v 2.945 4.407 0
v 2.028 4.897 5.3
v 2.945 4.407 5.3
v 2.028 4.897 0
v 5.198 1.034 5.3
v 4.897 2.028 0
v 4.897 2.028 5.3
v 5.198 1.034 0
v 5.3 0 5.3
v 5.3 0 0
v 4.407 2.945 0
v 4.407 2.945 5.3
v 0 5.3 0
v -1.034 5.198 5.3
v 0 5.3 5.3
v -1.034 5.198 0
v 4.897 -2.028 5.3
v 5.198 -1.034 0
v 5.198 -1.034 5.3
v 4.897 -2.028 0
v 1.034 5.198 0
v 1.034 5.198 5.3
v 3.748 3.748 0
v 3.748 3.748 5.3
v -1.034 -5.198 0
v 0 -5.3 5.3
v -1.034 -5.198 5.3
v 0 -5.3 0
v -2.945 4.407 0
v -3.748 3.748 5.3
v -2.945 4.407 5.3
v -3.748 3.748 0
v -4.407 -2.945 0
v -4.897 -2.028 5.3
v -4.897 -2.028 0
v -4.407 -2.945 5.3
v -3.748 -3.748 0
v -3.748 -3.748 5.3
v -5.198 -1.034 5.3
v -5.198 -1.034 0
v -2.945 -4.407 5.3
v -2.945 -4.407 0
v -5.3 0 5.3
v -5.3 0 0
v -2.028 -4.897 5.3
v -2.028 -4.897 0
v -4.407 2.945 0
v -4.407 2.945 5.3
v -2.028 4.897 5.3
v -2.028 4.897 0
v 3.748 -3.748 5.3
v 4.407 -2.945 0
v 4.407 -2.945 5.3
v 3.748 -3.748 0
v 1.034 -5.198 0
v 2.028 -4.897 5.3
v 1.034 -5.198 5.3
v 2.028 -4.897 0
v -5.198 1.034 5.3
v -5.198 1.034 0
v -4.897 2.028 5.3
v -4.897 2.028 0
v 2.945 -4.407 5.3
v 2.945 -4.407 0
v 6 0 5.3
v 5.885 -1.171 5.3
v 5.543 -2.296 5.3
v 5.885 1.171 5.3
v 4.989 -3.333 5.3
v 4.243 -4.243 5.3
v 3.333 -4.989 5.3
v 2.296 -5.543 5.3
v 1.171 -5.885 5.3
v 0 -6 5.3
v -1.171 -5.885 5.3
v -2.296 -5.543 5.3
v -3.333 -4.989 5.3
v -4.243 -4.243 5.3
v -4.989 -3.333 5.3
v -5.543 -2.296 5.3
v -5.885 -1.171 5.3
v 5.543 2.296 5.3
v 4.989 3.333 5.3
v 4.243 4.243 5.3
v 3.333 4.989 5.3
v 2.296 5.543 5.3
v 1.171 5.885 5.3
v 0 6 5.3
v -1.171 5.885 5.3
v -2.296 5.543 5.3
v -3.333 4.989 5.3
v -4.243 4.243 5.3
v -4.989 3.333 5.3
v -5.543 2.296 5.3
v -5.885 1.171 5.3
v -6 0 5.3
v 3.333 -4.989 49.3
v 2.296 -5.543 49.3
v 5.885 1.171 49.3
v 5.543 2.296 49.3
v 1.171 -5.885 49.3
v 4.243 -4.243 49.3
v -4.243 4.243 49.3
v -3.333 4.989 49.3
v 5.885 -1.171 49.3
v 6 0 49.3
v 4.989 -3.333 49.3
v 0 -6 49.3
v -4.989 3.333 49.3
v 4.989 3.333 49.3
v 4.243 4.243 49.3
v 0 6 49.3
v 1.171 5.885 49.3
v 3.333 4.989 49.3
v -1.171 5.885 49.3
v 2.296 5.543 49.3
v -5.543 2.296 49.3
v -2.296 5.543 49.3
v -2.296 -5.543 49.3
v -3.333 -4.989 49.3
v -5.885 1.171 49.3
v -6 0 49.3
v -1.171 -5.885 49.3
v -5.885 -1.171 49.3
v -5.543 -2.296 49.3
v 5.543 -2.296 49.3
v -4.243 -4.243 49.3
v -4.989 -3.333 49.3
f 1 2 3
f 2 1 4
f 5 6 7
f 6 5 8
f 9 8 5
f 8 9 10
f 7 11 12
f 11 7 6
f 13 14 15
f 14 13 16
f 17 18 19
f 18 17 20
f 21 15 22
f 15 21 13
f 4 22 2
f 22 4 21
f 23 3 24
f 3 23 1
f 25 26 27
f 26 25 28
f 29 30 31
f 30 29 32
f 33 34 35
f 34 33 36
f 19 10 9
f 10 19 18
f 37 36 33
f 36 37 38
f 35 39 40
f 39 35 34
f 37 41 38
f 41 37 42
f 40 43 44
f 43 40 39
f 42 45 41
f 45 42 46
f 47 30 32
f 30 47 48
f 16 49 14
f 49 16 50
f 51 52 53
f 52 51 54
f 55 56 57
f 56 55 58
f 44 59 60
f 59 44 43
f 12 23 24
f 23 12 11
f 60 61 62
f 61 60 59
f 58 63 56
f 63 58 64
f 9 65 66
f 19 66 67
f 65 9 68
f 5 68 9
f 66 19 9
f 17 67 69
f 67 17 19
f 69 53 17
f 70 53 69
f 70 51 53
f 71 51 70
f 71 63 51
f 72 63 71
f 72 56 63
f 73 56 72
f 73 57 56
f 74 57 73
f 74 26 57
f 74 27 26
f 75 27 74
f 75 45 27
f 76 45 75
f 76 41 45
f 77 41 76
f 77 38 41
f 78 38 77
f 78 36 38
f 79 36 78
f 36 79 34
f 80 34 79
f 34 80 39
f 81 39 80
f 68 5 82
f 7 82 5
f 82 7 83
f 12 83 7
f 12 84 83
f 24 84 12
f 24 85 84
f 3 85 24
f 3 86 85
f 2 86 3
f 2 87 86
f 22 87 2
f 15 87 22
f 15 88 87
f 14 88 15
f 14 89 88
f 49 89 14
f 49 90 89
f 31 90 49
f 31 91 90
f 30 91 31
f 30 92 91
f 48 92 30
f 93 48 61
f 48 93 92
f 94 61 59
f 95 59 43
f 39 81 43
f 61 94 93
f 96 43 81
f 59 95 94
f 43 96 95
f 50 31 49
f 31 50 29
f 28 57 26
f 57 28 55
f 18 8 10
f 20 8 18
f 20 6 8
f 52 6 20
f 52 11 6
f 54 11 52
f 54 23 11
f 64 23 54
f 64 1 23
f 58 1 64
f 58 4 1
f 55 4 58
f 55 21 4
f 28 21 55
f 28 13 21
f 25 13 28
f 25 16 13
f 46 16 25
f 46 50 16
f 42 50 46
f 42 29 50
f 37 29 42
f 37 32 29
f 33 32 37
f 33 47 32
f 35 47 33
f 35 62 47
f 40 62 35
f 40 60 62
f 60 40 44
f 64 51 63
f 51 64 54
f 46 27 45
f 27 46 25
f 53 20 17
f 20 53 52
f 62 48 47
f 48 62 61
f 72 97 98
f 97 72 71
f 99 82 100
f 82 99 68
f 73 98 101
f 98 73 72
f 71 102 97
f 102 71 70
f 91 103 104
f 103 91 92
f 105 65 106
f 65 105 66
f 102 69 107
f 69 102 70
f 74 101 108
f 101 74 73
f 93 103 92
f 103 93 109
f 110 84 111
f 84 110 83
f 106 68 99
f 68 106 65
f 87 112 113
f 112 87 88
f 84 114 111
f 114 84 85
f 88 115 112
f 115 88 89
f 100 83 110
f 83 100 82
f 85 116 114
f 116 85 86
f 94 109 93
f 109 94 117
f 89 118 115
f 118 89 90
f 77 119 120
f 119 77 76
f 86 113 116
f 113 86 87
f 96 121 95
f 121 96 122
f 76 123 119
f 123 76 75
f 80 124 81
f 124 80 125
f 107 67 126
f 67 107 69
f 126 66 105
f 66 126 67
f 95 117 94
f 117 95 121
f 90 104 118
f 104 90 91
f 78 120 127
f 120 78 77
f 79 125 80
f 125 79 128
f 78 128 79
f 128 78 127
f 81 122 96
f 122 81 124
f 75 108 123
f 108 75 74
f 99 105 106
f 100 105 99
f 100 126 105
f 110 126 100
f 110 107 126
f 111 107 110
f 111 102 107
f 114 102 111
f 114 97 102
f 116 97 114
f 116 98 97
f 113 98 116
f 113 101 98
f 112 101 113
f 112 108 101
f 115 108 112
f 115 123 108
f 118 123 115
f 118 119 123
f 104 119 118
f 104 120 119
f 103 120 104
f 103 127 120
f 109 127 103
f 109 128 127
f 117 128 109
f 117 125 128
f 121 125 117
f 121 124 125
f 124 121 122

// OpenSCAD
module LJ18A3_8_Z(){
    d=18;
    l=10;
    D=20;
    L=70;
    translate([0,0,0]) cylinder(d=d,h=l,$fn=32);
    color("silver") translate([0,0,l]) cylinder(d=D,h=L,$fn=32);
}

module LJ12A3_4_Z(){
    d=10.6;
    l=5.3;
    D=12;
    L=44;
    translate([0,0,0]) cylinder(d=d,h=l,$fn=32);
    color("silver") translate([0,0,l]) cylinder(d=D,h=L,$fn=32);
}


LJ12A3_4_Z();
